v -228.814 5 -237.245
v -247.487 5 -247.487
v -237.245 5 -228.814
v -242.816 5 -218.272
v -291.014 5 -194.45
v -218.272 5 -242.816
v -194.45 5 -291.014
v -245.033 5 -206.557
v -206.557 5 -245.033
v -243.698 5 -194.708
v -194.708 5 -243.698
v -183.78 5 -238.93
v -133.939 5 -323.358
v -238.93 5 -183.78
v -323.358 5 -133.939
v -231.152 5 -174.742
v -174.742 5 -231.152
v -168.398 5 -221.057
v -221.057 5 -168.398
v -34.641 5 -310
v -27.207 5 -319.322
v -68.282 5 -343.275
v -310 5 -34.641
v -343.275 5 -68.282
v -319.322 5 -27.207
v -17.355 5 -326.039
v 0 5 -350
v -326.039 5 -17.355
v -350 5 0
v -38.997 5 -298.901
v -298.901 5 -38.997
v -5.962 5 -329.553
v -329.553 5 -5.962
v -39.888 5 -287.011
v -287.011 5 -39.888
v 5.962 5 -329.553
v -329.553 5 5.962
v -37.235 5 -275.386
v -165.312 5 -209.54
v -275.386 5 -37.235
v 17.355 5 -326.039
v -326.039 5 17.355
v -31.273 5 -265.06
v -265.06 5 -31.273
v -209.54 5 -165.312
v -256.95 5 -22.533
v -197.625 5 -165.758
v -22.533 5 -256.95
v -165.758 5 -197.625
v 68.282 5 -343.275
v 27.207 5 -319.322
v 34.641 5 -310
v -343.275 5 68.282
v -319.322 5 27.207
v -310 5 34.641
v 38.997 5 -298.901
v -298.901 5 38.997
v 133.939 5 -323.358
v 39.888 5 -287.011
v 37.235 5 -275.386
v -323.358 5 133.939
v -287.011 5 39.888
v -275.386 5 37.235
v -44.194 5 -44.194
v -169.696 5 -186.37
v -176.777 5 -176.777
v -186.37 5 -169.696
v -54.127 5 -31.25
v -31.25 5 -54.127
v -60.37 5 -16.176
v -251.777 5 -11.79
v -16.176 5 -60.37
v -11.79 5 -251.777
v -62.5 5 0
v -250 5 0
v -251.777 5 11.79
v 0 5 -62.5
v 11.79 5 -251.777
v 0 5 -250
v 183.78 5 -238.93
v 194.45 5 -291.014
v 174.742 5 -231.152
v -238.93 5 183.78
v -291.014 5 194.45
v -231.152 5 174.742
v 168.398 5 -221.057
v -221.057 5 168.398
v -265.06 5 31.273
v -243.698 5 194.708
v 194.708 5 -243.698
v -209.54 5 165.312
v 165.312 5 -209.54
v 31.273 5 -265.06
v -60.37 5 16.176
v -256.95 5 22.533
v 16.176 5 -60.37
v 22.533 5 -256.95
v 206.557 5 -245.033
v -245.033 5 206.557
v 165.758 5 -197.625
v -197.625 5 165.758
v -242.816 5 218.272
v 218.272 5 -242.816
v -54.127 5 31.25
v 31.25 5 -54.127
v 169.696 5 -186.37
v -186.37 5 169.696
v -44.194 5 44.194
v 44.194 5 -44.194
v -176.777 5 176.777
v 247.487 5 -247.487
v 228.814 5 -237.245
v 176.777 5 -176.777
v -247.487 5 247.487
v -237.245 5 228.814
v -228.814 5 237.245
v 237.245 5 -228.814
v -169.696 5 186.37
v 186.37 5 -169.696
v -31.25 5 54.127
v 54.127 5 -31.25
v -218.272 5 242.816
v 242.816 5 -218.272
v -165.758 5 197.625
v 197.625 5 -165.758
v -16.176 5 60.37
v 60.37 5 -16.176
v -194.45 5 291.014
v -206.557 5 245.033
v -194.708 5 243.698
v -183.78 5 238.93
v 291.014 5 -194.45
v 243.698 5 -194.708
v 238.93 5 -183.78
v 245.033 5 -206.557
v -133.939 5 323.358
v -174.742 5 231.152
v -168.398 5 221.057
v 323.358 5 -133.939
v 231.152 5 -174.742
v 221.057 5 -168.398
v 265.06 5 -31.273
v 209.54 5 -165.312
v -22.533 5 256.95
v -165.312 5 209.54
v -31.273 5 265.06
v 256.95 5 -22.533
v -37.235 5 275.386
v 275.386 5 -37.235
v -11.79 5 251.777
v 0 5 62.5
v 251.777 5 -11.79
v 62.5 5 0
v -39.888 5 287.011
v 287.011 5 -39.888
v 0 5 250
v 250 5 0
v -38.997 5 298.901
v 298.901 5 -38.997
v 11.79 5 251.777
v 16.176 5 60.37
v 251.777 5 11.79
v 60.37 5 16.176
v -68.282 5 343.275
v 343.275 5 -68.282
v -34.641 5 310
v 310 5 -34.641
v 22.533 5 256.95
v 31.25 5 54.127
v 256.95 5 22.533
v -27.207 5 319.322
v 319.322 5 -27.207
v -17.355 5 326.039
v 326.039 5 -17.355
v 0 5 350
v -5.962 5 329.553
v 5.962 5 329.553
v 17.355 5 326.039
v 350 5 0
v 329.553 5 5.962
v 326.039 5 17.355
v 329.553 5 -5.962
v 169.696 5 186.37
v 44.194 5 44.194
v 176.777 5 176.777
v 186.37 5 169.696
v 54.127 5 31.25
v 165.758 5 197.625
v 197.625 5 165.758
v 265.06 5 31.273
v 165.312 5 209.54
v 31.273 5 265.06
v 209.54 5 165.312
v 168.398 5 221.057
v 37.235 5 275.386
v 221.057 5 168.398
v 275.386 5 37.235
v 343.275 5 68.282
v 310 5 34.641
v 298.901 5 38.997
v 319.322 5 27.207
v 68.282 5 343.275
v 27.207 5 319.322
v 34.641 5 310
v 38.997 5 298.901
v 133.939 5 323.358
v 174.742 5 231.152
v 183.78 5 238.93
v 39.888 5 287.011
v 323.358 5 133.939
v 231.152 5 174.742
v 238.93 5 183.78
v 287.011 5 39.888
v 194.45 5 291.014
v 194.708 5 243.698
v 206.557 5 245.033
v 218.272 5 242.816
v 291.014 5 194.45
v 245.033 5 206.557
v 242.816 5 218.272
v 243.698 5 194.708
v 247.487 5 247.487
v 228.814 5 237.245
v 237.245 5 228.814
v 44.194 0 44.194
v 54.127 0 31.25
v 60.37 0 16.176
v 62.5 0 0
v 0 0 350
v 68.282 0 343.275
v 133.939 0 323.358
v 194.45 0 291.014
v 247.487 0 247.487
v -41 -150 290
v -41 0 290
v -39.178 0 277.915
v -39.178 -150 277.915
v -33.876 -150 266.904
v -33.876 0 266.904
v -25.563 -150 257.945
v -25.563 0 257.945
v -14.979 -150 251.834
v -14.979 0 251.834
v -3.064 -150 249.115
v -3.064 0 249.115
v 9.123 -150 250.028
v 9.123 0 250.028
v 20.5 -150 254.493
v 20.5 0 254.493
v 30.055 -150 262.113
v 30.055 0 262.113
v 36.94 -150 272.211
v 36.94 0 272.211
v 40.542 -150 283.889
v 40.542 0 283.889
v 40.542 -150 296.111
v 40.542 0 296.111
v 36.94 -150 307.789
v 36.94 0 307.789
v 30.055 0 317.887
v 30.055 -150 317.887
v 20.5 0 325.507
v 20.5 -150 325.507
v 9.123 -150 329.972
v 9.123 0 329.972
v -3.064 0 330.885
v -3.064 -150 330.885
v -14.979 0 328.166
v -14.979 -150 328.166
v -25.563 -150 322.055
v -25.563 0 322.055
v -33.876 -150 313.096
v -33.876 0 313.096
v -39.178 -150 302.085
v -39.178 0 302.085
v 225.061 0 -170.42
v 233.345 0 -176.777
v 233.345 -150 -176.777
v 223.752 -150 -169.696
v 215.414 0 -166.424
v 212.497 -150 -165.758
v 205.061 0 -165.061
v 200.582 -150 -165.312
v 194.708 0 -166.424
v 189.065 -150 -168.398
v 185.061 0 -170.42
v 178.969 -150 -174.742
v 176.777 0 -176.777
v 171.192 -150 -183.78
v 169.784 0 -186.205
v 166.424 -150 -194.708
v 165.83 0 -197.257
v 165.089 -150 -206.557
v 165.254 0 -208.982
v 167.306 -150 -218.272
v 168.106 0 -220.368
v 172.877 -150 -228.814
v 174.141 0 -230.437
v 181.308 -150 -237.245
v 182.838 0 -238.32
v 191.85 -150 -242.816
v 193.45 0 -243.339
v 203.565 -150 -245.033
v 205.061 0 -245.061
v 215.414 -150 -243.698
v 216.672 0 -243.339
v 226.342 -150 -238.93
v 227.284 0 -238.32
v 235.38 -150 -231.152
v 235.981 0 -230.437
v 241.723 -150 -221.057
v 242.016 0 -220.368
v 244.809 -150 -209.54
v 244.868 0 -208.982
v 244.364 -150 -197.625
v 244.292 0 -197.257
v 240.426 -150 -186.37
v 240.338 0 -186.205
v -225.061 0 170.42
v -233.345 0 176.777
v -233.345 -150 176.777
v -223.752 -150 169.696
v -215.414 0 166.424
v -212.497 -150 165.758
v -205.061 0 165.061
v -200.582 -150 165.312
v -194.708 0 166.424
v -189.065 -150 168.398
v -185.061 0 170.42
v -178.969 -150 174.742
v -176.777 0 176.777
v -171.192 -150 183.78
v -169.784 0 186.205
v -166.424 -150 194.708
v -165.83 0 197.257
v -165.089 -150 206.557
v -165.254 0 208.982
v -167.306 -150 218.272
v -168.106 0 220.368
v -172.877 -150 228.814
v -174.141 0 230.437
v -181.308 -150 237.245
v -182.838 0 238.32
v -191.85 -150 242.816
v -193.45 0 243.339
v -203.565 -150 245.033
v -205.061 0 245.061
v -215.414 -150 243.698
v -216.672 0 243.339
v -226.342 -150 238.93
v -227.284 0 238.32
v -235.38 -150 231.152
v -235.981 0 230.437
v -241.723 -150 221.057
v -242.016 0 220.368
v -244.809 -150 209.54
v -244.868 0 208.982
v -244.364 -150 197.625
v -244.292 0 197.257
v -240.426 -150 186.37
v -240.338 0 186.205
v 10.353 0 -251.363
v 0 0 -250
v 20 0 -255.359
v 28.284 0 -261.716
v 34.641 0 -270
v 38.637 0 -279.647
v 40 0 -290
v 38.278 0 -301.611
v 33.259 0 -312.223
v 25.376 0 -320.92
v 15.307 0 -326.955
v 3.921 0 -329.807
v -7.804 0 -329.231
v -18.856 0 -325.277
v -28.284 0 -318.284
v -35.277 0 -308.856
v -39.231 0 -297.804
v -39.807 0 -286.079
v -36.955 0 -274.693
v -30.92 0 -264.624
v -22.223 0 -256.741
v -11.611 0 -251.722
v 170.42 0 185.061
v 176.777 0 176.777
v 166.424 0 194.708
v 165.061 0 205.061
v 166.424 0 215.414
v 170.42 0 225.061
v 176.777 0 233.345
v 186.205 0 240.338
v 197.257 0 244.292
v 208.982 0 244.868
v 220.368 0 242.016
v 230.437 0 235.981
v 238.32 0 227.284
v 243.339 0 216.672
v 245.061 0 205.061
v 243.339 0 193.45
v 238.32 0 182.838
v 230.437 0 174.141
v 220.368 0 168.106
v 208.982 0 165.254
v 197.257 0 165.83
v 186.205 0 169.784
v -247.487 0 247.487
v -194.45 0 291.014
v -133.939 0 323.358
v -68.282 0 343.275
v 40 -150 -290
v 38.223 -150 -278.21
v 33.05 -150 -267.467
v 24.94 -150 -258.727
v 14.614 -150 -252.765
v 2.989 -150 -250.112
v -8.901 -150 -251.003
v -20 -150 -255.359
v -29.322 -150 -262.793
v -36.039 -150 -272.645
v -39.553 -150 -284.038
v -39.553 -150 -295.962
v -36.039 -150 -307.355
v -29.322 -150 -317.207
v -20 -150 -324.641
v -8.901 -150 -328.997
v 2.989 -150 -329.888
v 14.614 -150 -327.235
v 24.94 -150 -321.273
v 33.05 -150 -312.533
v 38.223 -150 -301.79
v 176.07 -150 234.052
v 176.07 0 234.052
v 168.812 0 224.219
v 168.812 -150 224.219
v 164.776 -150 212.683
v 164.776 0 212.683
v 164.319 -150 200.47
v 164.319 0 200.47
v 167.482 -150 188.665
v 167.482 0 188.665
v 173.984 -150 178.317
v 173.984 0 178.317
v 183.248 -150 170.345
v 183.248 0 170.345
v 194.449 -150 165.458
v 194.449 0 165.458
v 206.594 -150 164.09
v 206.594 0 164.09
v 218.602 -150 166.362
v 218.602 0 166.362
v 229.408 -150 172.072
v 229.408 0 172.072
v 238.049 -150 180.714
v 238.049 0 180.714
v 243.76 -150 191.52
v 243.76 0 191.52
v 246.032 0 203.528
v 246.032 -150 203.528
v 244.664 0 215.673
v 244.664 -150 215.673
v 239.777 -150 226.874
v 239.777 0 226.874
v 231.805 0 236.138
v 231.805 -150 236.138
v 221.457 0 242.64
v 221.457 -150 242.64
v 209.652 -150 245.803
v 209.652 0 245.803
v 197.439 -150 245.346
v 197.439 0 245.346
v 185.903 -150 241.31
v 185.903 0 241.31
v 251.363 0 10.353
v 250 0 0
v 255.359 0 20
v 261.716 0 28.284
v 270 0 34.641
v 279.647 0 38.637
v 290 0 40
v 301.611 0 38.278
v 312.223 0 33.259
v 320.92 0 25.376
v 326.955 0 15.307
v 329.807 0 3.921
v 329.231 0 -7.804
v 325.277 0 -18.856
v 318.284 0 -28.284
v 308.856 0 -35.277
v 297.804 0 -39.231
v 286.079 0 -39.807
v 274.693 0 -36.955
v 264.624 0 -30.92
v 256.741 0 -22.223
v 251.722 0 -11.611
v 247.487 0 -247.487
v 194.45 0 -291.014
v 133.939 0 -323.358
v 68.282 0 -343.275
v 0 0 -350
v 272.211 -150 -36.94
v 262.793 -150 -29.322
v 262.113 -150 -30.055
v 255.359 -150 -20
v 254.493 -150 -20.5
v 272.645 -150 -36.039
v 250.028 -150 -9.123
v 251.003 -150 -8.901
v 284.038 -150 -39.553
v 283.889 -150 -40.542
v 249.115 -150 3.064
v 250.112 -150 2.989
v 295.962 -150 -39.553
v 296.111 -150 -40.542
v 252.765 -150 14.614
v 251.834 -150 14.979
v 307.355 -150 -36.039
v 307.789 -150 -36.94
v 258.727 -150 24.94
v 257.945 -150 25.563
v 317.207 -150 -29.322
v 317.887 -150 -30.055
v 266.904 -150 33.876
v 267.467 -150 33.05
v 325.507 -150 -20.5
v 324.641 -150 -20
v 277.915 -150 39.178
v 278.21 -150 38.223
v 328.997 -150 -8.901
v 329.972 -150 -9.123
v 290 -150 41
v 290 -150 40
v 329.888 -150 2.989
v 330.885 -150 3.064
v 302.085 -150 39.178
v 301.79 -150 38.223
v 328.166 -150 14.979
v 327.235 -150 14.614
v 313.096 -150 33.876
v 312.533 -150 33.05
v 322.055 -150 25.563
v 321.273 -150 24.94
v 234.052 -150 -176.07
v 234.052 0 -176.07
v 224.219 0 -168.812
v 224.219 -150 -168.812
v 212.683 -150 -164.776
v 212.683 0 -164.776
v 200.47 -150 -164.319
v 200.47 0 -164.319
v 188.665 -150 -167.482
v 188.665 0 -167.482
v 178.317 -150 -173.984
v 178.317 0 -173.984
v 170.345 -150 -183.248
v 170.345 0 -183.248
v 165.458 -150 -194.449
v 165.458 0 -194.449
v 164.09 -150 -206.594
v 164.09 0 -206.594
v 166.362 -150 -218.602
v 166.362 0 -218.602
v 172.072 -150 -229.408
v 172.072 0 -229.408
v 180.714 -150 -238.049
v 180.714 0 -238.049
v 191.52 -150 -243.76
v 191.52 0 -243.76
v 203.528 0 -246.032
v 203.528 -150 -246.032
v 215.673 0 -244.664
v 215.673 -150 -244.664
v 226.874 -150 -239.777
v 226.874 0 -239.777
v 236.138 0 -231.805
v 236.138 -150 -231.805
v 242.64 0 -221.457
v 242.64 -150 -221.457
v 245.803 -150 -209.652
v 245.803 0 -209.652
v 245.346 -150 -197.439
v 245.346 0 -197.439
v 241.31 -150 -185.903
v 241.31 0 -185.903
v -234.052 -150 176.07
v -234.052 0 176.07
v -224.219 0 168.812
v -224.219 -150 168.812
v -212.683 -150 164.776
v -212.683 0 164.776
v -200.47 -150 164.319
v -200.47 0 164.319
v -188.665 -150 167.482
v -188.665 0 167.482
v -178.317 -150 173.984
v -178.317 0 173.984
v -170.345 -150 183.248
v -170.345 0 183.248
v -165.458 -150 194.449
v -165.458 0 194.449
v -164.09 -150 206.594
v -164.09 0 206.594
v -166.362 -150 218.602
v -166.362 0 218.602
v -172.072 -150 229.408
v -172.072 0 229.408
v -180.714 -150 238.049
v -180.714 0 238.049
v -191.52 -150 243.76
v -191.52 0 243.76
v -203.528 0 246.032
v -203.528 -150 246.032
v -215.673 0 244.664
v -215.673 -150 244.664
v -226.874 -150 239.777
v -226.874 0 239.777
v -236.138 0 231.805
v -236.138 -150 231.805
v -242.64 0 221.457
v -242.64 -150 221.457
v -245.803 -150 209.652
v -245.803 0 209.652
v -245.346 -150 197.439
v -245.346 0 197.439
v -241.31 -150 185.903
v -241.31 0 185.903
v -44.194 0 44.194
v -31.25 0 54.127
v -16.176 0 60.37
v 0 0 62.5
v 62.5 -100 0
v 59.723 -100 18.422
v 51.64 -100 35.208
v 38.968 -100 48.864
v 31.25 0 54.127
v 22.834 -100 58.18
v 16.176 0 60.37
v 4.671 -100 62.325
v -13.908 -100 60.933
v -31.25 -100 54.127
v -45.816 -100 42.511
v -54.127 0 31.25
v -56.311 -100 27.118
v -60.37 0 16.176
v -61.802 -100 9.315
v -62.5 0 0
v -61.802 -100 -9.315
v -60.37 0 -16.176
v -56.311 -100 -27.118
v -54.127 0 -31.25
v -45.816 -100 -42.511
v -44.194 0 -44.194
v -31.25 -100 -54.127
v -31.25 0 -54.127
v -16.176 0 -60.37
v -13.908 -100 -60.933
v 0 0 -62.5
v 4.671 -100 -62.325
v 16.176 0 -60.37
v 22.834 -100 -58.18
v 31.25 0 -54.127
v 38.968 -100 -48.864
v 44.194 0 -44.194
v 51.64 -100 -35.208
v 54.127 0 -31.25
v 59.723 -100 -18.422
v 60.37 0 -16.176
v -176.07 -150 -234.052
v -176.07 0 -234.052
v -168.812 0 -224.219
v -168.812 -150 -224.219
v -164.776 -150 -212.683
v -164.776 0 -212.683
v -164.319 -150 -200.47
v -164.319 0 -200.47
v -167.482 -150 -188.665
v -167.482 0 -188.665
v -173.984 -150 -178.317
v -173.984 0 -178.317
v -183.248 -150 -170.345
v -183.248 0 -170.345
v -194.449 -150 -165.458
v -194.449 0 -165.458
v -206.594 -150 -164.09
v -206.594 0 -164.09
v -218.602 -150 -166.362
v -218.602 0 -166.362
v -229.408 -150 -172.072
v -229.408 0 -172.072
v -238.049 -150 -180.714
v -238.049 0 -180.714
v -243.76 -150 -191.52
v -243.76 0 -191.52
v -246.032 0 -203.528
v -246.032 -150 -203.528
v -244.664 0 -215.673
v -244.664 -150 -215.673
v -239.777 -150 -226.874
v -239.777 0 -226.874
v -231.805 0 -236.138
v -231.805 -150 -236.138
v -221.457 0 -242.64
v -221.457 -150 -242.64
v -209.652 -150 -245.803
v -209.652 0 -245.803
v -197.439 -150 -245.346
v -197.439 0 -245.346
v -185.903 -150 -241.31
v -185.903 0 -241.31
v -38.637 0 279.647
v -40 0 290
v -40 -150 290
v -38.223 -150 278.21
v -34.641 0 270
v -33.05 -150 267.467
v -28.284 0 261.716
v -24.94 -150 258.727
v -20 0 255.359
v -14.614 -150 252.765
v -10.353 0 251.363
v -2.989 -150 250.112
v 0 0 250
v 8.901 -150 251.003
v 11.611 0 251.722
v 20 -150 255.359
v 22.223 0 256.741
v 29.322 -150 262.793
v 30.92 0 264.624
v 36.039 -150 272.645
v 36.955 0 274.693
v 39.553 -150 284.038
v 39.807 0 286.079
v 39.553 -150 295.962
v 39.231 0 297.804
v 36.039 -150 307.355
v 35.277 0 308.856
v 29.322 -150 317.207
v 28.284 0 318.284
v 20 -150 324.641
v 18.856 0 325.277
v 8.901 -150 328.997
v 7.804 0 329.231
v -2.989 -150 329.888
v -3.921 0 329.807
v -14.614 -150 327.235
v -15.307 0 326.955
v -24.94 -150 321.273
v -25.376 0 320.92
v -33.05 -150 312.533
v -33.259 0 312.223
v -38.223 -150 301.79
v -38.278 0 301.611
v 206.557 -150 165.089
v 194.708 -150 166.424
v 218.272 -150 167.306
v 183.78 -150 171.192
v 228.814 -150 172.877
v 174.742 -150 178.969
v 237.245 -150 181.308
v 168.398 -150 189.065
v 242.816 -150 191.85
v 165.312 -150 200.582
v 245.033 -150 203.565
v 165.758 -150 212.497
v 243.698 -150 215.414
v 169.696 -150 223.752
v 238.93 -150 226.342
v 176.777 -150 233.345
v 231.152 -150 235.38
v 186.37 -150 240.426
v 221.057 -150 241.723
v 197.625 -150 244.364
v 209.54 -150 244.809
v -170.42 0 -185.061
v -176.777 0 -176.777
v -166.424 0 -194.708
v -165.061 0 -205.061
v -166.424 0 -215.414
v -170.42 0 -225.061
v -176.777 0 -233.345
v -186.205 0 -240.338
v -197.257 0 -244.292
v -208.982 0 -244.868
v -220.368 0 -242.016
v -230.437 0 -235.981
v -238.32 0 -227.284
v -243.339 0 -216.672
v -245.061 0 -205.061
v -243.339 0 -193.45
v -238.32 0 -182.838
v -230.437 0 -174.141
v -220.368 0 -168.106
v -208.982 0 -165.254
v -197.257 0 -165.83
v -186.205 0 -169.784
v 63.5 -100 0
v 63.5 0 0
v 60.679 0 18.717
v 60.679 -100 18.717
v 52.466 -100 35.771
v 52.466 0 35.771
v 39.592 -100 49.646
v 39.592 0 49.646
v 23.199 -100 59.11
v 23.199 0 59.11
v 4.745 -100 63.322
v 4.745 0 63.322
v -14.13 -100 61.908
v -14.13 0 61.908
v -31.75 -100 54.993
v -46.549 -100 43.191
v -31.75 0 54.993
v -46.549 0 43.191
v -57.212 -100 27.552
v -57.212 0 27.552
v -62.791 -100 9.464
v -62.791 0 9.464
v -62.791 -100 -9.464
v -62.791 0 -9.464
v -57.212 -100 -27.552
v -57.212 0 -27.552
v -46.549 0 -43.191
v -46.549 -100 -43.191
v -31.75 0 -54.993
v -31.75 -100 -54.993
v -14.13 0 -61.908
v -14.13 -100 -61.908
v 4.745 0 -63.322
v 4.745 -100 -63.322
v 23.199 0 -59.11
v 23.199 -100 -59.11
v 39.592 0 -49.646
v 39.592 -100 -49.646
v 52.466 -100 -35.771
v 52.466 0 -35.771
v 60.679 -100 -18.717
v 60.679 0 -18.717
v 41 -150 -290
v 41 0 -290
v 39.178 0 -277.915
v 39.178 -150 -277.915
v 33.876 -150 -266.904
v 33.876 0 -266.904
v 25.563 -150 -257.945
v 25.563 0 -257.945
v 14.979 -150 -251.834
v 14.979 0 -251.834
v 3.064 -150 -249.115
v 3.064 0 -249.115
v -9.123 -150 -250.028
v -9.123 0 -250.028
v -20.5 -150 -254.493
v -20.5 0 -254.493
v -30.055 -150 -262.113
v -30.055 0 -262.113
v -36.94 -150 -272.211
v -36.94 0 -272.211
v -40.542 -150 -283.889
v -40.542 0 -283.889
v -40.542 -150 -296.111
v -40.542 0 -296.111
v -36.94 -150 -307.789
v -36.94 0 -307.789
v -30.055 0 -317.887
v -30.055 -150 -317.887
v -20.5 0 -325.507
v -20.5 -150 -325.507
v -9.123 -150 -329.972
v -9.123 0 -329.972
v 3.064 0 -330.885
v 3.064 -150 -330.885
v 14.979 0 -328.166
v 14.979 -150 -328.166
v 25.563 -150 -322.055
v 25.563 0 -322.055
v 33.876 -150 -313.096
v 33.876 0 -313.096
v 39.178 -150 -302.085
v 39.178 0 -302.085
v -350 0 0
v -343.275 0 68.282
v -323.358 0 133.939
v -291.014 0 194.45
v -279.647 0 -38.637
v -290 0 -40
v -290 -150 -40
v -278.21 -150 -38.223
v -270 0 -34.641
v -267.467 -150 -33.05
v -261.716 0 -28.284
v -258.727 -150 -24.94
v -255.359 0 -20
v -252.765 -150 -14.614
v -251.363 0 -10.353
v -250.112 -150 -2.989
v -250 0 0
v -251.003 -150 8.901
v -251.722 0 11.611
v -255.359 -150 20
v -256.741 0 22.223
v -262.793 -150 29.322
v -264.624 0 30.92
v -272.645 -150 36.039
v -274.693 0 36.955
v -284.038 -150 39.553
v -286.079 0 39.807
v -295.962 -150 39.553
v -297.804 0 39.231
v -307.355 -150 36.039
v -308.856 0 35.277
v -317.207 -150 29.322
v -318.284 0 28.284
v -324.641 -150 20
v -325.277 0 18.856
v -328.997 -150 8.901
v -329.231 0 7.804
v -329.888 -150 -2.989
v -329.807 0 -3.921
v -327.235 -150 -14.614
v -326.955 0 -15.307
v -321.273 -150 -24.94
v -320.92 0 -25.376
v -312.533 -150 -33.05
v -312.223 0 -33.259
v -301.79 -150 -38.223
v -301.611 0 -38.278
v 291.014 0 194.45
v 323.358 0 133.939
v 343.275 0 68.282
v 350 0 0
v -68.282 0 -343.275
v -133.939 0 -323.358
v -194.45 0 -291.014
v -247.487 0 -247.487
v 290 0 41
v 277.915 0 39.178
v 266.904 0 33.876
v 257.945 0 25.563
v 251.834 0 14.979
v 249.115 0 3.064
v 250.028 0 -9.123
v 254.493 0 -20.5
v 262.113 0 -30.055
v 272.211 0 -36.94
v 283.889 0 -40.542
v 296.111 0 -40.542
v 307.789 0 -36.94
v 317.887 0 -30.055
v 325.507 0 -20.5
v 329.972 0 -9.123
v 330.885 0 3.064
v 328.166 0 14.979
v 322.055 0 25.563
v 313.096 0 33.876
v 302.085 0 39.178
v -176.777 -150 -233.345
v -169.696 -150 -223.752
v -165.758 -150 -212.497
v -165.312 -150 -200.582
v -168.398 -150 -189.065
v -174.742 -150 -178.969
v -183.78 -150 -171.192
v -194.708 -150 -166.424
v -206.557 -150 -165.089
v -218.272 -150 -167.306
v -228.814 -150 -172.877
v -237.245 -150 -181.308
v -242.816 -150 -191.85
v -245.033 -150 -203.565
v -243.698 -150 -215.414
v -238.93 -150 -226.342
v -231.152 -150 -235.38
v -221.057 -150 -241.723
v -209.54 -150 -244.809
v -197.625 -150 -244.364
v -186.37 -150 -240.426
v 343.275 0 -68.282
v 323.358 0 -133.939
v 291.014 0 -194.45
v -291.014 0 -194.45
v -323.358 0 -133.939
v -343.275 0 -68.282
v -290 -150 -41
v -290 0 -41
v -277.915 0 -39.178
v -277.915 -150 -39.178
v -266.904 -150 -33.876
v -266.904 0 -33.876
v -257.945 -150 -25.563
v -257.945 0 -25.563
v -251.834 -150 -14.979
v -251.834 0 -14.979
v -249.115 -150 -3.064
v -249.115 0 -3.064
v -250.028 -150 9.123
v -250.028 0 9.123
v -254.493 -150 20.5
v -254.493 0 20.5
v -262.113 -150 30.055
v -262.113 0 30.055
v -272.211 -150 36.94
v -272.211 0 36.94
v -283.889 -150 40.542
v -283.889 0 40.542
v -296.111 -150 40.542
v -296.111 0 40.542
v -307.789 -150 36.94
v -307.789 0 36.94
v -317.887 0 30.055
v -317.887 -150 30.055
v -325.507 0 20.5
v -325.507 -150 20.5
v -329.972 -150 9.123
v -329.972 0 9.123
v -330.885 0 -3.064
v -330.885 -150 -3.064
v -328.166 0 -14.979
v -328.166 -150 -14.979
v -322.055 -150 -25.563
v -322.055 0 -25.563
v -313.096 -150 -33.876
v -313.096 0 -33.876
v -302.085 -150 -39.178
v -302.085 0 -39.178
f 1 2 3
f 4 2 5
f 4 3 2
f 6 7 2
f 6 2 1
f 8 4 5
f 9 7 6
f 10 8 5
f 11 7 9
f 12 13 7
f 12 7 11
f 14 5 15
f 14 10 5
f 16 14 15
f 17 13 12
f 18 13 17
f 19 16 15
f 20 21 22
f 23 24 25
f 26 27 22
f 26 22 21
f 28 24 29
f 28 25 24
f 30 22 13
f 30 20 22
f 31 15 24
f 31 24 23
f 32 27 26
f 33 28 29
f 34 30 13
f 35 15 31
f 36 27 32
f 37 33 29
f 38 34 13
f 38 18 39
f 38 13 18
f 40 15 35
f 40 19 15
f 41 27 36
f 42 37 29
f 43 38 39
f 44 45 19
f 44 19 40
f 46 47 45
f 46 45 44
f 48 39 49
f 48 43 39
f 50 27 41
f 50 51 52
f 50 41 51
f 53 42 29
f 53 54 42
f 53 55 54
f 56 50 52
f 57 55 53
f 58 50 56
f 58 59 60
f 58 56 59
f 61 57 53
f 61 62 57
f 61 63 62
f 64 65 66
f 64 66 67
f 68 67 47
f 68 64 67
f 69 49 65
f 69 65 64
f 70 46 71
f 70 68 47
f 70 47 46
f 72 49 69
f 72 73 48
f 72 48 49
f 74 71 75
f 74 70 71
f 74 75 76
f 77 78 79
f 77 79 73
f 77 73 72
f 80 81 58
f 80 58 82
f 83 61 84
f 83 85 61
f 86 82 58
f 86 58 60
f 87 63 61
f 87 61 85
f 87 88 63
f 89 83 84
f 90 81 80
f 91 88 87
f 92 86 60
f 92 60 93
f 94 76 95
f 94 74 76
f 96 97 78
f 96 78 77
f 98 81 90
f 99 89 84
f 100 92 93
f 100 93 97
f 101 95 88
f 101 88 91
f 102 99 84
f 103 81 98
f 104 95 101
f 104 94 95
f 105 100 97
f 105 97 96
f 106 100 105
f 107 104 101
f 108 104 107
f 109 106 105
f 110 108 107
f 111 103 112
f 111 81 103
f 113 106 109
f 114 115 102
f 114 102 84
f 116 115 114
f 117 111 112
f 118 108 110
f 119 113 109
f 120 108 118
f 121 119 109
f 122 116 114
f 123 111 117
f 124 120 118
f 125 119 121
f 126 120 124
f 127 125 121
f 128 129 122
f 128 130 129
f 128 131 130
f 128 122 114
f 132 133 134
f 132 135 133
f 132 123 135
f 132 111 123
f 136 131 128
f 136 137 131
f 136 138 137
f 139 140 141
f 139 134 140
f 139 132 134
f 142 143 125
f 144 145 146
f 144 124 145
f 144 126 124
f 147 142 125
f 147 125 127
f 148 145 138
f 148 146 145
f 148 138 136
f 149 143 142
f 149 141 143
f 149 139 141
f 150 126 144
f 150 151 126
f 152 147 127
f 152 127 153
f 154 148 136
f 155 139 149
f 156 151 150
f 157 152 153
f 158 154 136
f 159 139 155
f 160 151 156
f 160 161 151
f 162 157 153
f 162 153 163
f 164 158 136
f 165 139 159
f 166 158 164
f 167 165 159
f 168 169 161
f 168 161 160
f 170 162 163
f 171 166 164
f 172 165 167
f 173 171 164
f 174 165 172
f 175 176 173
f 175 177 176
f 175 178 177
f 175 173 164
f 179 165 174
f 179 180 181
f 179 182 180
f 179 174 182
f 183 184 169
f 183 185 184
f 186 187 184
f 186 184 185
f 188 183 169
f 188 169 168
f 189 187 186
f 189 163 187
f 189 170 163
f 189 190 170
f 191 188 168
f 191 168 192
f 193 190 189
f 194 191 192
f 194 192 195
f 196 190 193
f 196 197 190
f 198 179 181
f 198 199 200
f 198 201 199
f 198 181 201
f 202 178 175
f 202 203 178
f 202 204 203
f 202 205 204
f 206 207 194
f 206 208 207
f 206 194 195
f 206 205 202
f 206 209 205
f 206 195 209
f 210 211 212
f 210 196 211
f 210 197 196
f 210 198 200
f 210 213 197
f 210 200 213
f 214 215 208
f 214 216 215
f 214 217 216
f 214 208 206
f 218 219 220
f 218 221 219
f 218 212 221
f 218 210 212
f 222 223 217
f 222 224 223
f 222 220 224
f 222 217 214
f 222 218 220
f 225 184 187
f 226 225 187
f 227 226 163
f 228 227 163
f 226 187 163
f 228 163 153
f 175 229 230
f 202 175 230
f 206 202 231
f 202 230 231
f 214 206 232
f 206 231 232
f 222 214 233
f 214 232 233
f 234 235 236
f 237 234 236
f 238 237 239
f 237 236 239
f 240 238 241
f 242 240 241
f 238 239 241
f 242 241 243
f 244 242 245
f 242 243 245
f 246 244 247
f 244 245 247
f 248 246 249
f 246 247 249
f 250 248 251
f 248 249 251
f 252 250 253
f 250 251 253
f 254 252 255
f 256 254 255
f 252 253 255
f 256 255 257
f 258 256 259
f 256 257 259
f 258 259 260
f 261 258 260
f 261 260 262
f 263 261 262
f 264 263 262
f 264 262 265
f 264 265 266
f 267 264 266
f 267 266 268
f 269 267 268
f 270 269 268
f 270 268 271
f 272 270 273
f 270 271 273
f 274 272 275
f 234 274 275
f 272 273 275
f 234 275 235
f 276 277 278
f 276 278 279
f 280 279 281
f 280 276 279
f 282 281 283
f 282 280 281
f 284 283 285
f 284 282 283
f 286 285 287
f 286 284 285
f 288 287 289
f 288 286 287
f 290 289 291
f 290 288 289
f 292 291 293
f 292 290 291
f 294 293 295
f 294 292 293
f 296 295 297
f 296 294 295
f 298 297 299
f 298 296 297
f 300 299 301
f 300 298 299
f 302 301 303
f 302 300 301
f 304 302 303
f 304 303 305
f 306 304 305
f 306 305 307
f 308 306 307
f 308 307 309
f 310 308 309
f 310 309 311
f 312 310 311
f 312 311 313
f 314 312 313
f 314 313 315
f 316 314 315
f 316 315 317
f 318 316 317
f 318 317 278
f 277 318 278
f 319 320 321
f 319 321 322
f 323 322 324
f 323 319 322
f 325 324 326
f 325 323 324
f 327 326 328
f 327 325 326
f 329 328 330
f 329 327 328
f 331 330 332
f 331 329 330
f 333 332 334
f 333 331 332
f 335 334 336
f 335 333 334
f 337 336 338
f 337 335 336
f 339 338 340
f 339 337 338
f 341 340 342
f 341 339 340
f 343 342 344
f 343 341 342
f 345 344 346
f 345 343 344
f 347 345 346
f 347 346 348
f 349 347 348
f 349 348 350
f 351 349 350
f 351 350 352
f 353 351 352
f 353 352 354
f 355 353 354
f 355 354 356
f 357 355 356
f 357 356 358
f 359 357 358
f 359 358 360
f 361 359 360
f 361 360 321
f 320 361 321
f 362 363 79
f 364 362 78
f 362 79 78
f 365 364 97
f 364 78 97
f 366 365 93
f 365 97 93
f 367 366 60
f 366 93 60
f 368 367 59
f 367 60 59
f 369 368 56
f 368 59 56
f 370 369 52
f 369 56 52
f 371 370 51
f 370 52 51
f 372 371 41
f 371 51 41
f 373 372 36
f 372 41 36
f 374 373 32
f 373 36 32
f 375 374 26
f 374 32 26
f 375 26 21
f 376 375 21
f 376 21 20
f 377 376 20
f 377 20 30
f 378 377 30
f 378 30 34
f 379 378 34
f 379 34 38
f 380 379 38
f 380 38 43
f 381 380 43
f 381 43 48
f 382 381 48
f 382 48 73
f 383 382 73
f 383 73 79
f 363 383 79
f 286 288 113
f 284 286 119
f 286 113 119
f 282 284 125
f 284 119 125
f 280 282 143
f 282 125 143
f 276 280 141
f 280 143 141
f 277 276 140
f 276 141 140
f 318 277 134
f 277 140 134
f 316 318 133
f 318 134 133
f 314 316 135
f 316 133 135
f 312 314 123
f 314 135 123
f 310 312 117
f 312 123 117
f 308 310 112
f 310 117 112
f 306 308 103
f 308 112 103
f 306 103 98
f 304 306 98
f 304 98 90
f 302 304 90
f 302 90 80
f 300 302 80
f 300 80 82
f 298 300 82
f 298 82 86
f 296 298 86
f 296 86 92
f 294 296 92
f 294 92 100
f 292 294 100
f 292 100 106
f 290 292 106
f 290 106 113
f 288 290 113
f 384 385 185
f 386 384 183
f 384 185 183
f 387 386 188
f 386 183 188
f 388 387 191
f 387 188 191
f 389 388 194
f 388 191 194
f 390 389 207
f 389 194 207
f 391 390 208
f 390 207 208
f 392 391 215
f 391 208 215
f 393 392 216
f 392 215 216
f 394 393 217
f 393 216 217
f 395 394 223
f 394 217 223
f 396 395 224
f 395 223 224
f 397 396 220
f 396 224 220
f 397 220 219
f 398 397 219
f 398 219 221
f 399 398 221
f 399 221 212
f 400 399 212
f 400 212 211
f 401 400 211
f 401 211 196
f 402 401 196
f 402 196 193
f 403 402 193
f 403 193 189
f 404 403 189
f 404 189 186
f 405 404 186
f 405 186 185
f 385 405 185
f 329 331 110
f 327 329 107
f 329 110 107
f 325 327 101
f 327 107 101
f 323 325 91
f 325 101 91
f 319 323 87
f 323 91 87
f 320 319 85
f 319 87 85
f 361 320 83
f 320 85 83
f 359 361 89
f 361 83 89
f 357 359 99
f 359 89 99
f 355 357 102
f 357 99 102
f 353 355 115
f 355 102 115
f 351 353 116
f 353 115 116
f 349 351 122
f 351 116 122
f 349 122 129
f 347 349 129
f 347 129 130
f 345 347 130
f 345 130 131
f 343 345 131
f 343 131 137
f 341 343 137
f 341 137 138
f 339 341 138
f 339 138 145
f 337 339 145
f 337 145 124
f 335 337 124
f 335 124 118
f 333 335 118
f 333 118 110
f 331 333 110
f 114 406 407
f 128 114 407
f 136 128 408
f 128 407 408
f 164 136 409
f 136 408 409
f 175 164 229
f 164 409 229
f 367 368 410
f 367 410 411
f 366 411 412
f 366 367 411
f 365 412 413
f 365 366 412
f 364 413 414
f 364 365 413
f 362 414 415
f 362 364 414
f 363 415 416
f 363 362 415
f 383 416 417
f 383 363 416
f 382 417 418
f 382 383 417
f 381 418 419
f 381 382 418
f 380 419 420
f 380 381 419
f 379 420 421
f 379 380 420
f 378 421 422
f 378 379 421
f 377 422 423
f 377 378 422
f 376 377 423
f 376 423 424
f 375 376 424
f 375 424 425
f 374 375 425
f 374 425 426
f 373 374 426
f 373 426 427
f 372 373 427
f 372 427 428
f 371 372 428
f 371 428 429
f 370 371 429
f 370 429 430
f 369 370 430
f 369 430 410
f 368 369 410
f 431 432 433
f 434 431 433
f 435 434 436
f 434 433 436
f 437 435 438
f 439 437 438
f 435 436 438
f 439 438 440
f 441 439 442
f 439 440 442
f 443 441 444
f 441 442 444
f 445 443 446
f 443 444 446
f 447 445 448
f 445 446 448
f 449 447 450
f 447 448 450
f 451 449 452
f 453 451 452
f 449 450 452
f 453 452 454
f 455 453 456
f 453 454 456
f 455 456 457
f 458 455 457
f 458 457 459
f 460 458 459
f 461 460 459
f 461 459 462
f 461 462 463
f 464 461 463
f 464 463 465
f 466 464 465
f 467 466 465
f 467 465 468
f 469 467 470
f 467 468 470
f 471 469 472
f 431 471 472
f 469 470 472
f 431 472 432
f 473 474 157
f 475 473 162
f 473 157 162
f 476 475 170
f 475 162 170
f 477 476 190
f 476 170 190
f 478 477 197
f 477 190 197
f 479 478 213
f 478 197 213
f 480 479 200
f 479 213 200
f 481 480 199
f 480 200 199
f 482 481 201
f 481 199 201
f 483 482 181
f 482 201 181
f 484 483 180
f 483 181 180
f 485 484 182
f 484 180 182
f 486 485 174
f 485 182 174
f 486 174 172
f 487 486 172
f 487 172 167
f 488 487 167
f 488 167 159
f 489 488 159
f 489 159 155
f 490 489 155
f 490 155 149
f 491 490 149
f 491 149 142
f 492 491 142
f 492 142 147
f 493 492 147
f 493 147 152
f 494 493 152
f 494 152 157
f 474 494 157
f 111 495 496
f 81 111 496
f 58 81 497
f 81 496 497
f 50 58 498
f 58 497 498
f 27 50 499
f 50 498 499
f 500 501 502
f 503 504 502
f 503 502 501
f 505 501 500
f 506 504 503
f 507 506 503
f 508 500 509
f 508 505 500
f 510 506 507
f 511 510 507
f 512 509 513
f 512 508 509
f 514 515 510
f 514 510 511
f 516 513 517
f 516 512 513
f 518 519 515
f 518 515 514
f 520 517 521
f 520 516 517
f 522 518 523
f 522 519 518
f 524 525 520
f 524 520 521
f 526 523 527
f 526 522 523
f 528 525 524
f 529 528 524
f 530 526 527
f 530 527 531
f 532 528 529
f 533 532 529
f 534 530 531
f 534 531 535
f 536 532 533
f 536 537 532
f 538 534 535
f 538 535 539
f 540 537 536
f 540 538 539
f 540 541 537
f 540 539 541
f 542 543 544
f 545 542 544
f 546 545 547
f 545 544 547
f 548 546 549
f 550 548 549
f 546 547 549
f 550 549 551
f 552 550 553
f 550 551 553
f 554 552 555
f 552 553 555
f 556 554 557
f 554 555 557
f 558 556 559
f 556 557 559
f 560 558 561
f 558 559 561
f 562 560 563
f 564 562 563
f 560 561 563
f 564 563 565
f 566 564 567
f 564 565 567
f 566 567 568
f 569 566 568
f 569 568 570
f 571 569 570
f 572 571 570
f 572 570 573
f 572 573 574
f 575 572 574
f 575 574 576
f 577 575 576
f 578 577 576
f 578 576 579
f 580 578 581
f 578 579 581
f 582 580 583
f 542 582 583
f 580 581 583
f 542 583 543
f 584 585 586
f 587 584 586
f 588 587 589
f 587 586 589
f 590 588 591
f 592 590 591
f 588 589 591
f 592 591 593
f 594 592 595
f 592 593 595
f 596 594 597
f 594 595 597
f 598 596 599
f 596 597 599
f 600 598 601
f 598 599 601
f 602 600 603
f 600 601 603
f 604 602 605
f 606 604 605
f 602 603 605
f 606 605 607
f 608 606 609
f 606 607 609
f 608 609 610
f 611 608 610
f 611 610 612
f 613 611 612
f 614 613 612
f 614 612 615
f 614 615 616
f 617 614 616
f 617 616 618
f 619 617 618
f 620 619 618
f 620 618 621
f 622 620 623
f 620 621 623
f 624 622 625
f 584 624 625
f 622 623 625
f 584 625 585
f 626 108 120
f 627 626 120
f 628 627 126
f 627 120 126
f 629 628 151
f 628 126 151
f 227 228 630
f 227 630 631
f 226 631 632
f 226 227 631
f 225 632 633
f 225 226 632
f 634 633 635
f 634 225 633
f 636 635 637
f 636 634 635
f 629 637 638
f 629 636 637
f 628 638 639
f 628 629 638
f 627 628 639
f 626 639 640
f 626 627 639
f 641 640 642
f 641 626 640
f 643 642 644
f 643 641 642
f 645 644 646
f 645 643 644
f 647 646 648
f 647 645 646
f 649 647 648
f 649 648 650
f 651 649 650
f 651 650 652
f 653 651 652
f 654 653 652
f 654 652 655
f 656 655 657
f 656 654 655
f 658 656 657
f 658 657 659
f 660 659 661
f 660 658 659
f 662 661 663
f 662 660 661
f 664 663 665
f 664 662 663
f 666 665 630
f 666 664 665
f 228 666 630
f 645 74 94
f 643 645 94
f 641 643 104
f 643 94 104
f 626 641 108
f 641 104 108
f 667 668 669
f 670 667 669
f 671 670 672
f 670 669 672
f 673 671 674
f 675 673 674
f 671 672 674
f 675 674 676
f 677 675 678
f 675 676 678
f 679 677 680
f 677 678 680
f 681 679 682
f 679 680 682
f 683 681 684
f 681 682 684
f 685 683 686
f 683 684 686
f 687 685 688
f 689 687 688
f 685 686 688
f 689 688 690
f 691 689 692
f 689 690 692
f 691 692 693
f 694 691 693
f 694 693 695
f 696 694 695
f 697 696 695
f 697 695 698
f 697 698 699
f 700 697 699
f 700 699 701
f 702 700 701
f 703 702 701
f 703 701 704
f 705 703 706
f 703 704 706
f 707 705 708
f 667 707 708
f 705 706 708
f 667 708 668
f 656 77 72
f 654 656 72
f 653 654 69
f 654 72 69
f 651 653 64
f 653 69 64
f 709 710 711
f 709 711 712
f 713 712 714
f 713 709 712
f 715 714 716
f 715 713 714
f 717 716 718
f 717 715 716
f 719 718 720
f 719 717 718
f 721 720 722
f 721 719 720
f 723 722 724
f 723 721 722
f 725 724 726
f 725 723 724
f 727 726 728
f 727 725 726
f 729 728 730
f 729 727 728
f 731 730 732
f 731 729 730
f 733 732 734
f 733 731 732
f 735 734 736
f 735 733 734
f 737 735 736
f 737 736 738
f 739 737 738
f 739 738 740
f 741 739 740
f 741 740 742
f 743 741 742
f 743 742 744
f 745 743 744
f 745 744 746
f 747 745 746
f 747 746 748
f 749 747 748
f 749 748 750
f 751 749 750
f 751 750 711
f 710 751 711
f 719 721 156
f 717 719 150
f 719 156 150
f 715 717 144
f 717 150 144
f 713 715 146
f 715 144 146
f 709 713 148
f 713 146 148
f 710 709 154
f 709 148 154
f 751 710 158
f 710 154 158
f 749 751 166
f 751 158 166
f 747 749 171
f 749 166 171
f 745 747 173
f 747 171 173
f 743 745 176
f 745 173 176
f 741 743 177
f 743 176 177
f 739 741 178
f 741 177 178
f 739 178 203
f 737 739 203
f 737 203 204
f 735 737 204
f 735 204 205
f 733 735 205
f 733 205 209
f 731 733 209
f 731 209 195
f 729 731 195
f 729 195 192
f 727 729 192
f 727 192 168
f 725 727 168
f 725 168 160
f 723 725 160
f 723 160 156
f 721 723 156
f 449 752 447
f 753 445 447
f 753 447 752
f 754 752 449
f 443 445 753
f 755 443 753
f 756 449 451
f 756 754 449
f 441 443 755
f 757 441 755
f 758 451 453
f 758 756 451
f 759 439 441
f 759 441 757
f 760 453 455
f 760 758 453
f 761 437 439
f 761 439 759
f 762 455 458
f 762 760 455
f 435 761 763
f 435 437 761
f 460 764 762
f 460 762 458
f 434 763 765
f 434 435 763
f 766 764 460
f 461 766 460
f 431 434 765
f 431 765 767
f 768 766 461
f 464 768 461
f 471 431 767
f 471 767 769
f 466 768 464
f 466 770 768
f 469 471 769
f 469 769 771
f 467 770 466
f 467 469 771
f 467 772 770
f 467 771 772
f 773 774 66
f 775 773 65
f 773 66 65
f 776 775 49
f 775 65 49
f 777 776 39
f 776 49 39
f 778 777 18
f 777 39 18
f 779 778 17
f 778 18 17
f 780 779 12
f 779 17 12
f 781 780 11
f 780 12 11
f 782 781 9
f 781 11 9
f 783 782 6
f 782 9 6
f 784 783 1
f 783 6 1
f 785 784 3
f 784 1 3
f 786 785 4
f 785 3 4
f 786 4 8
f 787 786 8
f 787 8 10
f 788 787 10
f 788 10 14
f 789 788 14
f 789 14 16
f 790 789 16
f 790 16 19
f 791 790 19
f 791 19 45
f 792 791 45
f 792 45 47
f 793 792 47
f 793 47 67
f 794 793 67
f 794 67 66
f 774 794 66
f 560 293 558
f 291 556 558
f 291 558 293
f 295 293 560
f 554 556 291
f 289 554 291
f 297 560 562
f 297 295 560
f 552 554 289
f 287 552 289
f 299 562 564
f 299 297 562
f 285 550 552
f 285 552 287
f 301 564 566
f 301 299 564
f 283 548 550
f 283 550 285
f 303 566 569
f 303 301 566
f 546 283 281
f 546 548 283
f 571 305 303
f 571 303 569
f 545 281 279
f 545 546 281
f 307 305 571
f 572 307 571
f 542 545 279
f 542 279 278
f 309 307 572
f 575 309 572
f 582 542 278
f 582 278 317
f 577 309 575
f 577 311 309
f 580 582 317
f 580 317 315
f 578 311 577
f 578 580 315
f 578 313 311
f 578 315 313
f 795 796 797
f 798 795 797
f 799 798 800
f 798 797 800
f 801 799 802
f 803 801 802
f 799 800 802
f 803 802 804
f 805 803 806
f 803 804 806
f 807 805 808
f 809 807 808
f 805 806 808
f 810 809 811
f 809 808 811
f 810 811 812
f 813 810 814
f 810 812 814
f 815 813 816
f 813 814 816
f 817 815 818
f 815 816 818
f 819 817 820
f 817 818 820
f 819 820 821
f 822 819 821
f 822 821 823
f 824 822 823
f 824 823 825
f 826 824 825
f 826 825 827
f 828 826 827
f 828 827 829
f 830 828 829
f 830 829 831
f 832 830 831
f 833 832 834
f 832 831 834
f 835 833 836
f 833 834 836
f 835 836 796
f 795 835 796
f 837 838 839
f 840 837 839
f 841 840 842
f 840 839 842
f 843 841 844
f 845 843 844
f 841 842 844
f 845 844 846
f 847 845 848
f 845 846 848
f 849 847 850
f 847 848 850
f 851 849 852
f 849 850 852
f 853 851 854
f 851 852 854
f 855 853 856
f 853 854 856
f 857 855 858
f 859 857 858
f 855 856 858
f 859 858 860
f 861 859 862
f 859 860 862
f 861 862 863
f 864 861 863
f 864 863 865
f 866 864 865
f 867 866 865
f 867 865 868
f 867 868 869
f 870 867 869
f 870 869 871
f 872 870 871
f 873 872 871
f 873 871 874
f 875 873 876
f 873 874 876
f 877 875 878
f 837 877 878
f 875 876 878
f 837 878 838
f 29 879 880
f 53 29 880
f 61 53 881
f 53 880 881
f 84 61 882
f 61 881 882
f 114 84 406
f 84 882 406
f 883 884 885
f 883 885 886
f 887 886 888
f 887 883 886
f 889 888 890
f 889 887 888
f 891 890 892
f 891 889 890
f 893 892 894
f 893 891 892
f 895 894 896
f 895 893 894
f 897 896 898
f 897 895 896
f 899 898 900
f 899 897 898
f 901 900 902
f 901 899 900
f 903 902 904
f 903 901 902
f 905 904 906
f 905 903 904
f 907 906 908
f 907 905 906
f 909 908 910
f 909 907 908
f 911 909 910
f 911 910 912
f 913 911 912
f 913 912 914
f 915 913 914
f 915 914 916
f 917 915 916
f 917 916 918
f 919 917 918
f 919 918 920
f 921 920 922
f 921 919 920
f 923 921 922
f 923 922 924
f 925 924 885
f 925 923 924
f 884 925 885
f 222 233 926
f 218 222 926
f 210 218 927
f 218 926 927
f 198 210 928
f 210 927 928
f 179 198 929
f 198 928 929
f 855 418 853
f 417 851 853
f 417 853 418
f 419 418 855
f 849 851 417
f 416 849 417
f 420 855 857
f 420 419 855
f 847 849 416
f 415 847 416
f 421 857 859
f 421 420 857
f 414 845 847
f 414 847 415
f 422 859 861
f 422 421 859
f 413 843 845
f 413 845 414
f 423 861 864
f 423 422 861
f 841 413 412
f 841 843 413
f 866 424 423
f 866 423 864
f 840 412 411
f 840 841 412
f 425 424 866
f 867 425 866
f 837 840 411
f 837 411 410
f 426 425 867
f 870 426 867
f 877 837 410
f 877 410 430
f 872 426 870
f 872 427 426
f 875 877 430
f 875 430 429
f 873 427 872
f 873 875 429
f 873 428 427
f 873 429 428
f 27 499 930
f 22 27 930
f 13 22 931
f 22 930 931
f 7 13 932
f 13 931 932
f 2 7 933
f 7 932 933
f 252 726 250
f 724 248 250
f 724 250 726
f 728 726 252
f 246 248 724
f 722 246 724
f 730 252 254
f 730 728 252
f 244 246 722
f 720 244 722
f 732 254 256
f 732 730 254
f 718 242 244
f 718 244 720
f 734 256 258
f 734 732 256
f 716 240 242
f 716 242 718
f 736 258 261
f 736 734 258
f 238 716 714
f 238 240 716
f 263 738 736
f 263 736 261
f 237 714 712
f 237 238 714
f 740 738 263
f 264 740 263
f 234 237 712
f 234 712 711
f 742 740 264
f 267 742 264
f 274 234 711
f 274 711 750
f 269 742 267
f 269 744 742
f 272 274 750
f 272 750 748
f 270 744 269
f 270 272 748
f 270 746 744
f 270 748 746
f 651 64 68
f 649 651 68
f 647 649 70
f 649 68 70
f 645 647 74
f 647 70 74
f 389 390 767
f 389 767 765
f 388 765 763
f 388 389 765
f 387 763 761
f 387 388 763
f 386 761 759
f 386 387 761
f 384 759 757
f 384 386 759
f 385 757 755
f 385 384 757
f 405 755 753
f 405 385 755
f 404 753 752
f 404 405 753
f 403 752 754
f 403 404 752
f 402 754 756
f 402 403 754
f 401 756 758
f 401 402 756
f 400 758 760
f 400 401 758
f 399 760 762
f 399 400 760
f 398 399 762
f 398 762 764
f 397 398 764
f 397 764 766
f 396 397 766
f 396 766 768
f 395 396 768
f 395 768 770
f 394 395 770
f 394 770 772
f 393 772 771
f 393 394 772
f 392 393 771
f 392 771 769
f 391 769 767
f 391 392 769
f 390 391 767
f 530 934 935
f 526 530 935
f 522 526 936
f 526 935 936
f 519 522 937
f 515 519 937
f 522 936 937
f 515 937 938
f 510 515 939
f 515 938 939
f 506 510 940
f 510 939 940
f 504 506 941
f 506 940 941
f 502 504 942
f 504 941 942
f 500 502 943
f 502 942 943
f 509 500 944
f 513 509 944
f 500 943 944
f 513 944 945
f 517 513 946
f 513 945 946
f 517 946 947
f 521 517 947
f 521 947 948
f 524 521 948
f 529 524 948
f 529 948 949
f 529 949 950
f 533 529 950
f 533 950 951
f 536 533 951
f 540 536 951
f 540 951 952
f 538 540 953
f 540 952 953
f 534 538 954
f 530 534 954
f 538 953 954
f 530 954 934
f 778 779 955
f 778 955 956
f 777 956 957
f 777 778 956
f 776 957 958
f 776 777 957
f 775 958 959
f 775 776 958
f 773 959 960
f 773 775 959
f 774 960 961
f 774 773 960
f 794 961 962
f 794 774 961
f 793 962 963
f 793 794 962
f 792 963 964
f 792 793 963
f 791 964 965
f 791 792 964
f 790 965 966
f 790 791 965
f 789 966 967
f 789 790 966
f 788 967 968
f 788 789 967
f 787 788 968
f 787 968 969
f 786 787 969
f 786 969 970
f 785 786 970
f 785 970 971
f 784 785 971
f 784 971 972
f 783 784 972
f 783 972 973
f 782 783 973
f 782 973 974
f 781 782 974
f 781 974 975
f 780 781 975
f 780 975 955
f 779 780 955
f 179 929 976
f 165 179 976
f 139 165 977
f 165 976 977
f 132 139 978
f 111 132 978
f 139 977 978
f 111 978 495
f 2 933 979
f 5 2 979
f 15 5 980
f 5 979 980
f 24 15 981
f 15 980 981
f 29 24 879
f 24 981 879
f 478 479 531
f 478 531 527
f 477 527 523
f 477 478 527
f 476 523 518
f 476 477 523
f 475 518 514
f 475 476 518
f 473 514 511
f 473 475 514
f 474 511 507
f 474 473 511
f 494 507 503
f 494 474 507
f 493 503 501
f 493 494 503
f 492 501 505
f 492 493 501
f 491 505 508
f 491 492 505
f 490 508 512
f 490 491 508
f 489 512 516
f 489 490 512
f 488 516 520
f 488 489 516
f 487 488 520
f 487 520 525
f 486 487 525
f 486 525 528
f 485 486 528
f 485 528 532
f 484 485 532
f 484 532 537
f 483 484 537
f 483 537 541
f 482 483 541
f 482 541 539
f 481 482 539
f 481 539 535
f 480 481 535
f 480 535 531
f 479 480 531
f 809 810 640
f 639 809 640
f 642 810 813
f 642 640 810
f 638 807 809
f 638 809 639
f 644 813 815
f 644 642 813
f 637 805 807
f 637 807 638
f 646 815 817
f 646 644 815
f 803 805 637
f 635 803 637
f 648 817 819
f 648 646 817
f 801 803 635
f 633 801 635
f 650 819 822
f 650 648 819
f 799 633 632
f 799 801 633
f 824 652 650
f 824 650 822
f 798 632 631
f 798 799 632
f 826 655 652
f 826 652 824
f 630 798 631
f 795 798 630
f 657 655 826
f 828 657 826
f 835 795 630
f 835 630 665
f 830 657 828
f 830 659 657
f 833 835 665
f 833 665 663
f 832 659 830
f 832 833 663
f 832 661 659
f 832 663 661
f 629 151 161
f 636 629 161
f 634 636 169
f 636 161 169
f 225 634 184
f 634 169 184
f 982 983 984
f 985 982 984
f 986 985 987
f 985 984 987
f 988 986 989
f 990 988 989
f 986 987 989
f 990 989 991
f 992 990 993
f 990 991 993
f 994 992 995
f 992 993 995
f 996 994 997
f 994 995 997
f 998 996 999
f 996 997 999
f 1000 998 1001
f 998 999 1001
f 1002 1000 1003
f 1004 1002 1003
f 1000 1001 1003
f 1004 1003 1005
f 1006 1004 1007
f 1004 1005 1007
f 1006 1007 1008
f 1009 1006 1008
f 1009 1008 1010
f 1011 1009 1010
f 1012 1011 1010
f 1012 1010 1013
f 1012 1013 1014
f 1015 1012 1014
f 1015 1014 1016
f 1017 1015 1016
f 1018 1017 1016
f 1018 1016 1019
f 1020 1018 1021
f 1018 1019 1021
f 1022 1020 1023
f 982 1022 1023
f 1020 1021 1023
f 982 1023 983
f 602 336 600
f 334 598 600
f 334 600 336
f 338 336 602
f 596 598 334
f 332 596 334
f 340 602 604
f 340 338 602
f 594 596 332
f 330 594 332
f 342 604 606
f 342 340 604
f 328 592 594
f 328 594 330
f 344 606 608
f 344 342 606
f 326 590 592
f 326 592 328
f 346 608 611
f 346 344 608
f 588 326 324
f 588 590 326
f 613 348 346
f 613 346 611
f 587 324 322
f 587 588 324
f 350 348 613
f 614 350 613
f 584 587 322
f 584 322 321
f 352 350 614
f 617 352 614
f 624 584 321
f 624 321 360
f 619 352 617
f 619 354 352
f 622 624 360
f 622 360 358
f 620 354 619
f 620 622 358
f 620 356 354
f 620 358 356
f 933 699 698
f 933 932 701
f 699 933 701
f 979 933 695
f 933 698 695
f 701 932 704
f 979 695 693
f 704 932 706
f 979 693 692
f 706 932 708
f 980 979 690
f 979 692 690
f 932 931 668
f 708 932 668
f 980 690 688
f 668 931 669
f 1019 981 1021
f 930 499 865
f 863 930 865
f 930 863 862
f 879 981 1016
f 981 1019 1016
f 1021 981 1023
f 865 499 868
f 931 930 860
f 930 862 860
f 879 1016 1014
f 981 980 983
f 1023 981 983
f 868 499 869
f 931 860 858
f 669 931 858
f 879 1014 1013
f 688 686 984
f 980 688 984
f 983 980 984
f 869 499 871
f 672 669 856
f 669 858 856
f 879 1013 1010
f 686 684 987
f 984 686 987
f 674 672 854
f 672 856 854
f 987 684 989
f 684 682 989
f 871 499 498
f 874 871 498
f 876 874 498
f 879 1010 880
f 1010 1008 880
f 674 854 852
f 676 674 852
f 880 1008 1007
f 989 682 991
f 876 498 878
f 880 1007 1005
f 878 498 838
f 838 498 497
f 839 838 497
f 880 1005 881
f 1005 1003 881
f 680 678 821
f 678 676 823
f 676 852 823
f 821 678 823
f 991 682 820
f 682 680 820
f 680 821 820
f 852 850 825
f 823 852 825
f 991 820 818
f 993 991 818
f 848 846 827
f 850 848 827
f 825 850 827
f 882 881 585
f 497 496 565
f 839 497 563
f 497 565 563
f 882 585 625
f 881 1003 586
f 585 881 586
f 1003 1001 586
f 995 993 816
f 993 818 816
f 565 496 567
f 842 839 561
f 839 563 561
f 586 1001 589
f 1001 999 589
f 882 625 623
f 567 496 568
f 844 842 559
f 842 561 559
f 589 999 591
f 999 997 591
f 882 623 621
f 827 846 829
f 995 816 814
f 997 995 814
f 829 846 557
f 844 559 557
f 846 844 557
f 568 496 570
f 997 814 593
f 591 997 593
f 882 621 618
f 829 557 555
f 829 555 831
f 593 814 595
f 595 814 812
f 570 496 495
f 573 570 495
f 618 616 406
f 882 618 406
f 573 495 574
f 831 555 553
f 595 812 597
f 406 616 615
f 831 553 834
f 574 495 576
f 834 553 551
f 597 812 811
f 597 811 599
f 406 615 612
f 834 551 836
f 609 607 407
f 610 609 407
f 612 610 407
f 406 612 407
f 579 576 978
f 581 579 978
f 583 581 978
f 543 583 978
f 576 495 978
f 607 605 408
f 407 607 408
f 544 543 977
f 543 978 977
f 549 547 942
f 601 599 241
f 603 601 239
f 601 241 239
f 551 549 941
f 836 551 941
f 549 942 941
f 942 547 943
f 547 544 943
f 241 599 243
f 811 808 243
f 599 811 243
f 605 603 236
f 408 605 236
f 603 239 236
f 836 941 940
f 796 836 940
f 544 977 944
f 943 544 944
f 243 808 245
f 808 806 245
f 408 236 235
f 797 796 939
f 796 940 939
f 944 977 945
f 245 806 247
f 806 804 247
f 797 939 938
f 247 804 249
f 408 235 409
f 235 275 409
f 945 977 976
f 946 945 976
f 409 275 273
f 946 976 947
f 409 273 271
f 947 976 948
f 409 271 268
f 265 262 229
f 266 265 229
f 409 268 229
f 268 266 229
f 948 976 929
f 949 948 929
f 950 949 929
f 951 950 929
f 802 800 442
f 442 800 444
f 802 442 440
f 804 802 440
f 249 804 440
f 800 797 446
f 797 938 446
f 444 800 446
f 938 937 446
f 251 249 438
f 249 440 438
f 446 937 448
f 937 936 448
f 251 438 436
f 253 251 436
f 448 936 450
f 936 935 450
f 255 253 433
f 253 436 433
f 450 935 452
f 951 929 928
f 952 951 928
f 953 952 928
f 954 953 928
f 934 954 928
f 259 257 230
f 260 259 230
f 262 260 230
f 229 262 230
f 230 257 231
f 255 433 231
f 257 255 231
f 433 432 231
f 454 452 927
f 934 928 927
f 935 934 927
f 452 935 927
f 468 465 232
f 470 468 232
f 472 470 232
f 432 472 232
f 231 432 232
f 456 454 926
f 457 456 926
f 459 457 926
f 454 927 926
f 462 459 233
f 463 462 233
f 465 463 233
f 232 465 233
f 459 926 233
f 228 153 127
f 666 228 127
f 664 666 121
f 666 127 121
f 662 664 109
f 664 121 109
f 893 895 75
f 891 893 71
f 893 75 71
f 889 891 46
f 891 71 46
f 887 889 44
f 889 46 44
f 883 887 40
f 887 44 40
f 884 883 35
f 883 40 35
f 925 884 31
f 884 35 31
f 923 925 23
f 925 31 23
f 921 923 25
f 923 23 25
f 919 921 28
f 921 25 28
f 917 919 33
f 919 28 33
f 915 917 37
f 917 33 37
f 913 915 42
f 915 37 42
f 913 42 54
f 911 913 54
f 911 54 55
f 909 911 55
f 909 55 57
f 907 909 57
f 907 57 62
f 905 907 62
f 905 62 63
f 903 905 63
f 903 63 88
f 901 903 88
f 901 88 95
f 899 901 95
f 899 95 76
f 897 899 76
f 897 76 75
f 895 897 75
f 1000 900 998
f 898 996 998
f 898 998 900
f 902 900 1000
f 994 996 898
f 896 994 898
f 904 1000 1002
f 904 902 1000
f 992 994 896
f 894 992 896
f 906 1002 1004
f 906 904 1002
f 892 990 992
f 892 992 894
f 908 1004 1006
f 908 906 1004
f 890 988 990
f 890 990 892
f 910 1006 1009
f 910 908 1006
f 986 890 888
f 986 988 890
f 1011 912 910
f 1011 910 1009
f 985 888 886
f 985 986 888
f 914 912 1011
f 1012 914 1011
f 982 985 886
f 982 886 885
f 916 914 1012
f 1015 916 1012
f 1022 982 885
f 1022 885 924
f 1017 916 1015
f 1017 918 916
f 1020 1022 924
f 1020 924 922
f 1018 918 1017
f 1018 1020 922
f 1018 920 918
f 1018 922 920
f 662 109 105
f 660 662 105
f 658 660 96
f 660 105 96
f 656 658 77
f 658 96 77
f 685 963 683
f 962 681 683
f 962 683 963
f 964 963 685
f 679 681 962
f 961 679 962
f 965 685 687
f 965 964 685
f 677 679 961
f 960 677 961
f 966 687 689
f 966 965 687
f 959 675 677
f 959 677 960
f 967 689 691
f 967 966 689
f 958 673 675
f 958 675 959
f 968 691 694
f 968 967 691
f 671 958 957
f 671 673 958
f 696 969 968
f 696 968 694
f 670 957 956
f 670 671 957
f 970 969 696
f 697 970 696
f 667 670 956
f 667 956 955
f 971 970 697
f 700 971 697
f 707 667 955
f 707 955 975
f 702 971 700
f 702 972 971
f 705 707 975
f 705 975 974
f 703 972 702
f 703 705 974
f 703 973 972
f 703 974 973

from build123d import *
from build123d.topology import SkipClean

# Parameters (mm, degrees)
SKETCH1_R                = 350
BOSS_EXTRUDE1_DEPTH      = 5
SKETCH3_R                = 62.5
CUT_EXTRUDE2_DEPTH       = 496
SKETCH2_R                = 40
CUT_EXTRUDE1_DEPTH       = 5
SURFACE_EXTRUDE2_1_DEPTH = 150
THICKEN2_T2              = 1
CIRPATTERN4_COUNT        = 8
CIRPATTERN6_COUNT        = 8
SURFACE_EXTRUDE3_2_DEPTH = 100
THICKEN3_T2              = 1


with BuildPart() as part:
    # Sketch1 → Boss-Extrude1 (new body)
    with BuildSketch(Plane(origin=(0, 0, 0), x_dir=(1, 0, 0), z_dir=(0, 1, 0))):
        with Locations(Location((0, 0, 0), (0, 0, 270))):
            Circle(SKETCH1_R)
    extrude(amount=BOSS_EXTRUDE1_DEPTH)

    # Sketch3 → Cut-Extrude2 (cut, through all)
    with BuildSketch(Plane(origin=(0, 5, 0), x_dir=(1, 0, 0), z_dir=(0, 1, 0))):
        with Locations(Location((0, 0, 0), (0, 0, 270))):
            Circle(SKETCH3_R)
    extrude(amount=-CUT_EXTRUDE2_DEPTH, mode=Mode.SUBTRACT)

    # Sketch2 → Cut-Extrude1 (cut)
    with BuildSketch(Plane(origin=(0, 5, 0), x_dir=(1, 0, 0), z_dir=(0, 1, 0))):
        with Locations(Location((0, 290, 0), (0, 0, 270))):
            Circle(SKETCH2_R)
    cut_extrude1 = extrude(amount=-CUT_EXTRUDE1_DEPTH, mode=Mode.SUBTRACT)

    # Surface-Extrude2: a surface, the sketch's curves swept straight by 150 mm
    with SkipClean():  # the faces are left unmerged after this step: merging them gives an invalid solid
        with BuildLine(Plane.XZ, mode=Mode.PRIVATE) as surface_extrude2_1_path:
            CenterArc((0, -290), 40, 0, 360)
        surface_extrude2_1 = Shell.extrude(surface_extrude2_1_path.wire(), (0 * SURFACE_EXTRUDE2_1_DEPTH, -1 * SURFACE_EXTRUDE2_1_DEPTH, 0 * SURFACE_EXTRUDE2_1_DEPTH))
        add(Solid.thicken(surface_extrude2_1, -THICKEN2_T2))

    # CirPattern4: Cut-Extrude1 ×8 about axis
    with SkipClean():  # the faces are left unmerged after this step: merging them gives an invalid solid
        cirpattern4_axis = Axis((0, 5, 0), (0, 1, 0))
        for i in range(1, CIRPATTERN4_COUNT):
            add(cut_extrude1.rotate(cirpattern4_axis, i * 360 / CIRPATTERN4_COUNT), mode=Mode.SUBTRACT)


with BuildPart() as cirpattern6_1:
    # CirPattern6: pattern copy
    add(part.part.rotate(Axis((0, 0, 0), (0, 1, 0)), 1 * 360 / CIRPATTERN6_COUNT))


with BuildPart() as cirpattern6_2:
    # CirPattern6: pattern copy
    add(part.part.rotate(Axis((0, 0, 0), (0, 1, 0)), 2 * 360 / CIRPATTERN6_COUNT))


with BuildPart() as cirpattern6_3:
    # CirPattern6: pattern copy
    add(part.part.rotate(Axis((0, 0, 0), (0, 1, 0)), 3 * 360 / CIRPATTERN6_COUNT))


with BuildPart() as cirpattern6_4:
    # CirPattern6: pattern copy
    add(part.part.rotate(Axis((0, 0, 0), (0, 1, 0)), 4 * 360 / CIRPATTERN6_COUNT))


with BuildPart() as cirpattern6_5:
    # CirPattern6: pattern copy
    add(part.part.rotate(Axis((0, 0, 0), (0, 1, 0)), 5 * 360 / CIRPATTERN6_COUNT))


with BuildPart() as cirpattern6_6:
    # CirPattern6: pattern copy
    add(part.part.rotate(Axis((0, 0, 0), (0, 1, 0)), 6 * 360 / CIRPATTERN6_COUNT))


with BuildPart() as cirpattern6_7:
    # CirPattern6: pattern copy
    add(part.part.rotate(Axis((0, 0, 0), (0, 1, 0)), 7 * 360 / CIRPATTERN6_COUNT))


with BuildPart() as part_1:
    with SkipClean():  # the faces are left unmerged after this step: merging them gives an invalid solid
        add(part.part)

        add(cirpattern6_1.part)  # Thicken3 merges CirPattern6_1

        add(cirpattern6_2.part)  # Thicken3 merges CirPattern6_2

        add(cirpattern6_3.part)  # Thicken3 merges CirPattern6_3

        add(cirpattern6_4.part)  # Thicken3 merges CirPattern6_4

        add(cirpattern6_5.part)  # Thicken3 merges CirPattern6_5

        add(cirpattern6_6.part)  # Thicken3 merges CirPattern6_6

        add(cirpattern6_7.part)  # Thicken3 merges CirPattern6_7
        # Surface-Extrude3: a surface, the sketch's curves swept straight by 100 mm
        with BuildLine(Plane.XZ, mode=Mode.PRIVATE) as surface_extrude3_2_path:
            CenterArc((0, 0), 62.5, 0, 360)
        surface_extrude3_2 = Shell.extrude(surface_extrude3_2_path.wire(), (0 * SURFACE_EXTRUDE3_2_DEPTH, -1 * SURFACE_EXTRUDE3_2_DEPTH, 0 * SURFACE_EXTRUDE3_2_DEPTH))
        add(Solid.thicken(surface_extrude3_2, -THICKEN3_T2))


solid = part_1.part
